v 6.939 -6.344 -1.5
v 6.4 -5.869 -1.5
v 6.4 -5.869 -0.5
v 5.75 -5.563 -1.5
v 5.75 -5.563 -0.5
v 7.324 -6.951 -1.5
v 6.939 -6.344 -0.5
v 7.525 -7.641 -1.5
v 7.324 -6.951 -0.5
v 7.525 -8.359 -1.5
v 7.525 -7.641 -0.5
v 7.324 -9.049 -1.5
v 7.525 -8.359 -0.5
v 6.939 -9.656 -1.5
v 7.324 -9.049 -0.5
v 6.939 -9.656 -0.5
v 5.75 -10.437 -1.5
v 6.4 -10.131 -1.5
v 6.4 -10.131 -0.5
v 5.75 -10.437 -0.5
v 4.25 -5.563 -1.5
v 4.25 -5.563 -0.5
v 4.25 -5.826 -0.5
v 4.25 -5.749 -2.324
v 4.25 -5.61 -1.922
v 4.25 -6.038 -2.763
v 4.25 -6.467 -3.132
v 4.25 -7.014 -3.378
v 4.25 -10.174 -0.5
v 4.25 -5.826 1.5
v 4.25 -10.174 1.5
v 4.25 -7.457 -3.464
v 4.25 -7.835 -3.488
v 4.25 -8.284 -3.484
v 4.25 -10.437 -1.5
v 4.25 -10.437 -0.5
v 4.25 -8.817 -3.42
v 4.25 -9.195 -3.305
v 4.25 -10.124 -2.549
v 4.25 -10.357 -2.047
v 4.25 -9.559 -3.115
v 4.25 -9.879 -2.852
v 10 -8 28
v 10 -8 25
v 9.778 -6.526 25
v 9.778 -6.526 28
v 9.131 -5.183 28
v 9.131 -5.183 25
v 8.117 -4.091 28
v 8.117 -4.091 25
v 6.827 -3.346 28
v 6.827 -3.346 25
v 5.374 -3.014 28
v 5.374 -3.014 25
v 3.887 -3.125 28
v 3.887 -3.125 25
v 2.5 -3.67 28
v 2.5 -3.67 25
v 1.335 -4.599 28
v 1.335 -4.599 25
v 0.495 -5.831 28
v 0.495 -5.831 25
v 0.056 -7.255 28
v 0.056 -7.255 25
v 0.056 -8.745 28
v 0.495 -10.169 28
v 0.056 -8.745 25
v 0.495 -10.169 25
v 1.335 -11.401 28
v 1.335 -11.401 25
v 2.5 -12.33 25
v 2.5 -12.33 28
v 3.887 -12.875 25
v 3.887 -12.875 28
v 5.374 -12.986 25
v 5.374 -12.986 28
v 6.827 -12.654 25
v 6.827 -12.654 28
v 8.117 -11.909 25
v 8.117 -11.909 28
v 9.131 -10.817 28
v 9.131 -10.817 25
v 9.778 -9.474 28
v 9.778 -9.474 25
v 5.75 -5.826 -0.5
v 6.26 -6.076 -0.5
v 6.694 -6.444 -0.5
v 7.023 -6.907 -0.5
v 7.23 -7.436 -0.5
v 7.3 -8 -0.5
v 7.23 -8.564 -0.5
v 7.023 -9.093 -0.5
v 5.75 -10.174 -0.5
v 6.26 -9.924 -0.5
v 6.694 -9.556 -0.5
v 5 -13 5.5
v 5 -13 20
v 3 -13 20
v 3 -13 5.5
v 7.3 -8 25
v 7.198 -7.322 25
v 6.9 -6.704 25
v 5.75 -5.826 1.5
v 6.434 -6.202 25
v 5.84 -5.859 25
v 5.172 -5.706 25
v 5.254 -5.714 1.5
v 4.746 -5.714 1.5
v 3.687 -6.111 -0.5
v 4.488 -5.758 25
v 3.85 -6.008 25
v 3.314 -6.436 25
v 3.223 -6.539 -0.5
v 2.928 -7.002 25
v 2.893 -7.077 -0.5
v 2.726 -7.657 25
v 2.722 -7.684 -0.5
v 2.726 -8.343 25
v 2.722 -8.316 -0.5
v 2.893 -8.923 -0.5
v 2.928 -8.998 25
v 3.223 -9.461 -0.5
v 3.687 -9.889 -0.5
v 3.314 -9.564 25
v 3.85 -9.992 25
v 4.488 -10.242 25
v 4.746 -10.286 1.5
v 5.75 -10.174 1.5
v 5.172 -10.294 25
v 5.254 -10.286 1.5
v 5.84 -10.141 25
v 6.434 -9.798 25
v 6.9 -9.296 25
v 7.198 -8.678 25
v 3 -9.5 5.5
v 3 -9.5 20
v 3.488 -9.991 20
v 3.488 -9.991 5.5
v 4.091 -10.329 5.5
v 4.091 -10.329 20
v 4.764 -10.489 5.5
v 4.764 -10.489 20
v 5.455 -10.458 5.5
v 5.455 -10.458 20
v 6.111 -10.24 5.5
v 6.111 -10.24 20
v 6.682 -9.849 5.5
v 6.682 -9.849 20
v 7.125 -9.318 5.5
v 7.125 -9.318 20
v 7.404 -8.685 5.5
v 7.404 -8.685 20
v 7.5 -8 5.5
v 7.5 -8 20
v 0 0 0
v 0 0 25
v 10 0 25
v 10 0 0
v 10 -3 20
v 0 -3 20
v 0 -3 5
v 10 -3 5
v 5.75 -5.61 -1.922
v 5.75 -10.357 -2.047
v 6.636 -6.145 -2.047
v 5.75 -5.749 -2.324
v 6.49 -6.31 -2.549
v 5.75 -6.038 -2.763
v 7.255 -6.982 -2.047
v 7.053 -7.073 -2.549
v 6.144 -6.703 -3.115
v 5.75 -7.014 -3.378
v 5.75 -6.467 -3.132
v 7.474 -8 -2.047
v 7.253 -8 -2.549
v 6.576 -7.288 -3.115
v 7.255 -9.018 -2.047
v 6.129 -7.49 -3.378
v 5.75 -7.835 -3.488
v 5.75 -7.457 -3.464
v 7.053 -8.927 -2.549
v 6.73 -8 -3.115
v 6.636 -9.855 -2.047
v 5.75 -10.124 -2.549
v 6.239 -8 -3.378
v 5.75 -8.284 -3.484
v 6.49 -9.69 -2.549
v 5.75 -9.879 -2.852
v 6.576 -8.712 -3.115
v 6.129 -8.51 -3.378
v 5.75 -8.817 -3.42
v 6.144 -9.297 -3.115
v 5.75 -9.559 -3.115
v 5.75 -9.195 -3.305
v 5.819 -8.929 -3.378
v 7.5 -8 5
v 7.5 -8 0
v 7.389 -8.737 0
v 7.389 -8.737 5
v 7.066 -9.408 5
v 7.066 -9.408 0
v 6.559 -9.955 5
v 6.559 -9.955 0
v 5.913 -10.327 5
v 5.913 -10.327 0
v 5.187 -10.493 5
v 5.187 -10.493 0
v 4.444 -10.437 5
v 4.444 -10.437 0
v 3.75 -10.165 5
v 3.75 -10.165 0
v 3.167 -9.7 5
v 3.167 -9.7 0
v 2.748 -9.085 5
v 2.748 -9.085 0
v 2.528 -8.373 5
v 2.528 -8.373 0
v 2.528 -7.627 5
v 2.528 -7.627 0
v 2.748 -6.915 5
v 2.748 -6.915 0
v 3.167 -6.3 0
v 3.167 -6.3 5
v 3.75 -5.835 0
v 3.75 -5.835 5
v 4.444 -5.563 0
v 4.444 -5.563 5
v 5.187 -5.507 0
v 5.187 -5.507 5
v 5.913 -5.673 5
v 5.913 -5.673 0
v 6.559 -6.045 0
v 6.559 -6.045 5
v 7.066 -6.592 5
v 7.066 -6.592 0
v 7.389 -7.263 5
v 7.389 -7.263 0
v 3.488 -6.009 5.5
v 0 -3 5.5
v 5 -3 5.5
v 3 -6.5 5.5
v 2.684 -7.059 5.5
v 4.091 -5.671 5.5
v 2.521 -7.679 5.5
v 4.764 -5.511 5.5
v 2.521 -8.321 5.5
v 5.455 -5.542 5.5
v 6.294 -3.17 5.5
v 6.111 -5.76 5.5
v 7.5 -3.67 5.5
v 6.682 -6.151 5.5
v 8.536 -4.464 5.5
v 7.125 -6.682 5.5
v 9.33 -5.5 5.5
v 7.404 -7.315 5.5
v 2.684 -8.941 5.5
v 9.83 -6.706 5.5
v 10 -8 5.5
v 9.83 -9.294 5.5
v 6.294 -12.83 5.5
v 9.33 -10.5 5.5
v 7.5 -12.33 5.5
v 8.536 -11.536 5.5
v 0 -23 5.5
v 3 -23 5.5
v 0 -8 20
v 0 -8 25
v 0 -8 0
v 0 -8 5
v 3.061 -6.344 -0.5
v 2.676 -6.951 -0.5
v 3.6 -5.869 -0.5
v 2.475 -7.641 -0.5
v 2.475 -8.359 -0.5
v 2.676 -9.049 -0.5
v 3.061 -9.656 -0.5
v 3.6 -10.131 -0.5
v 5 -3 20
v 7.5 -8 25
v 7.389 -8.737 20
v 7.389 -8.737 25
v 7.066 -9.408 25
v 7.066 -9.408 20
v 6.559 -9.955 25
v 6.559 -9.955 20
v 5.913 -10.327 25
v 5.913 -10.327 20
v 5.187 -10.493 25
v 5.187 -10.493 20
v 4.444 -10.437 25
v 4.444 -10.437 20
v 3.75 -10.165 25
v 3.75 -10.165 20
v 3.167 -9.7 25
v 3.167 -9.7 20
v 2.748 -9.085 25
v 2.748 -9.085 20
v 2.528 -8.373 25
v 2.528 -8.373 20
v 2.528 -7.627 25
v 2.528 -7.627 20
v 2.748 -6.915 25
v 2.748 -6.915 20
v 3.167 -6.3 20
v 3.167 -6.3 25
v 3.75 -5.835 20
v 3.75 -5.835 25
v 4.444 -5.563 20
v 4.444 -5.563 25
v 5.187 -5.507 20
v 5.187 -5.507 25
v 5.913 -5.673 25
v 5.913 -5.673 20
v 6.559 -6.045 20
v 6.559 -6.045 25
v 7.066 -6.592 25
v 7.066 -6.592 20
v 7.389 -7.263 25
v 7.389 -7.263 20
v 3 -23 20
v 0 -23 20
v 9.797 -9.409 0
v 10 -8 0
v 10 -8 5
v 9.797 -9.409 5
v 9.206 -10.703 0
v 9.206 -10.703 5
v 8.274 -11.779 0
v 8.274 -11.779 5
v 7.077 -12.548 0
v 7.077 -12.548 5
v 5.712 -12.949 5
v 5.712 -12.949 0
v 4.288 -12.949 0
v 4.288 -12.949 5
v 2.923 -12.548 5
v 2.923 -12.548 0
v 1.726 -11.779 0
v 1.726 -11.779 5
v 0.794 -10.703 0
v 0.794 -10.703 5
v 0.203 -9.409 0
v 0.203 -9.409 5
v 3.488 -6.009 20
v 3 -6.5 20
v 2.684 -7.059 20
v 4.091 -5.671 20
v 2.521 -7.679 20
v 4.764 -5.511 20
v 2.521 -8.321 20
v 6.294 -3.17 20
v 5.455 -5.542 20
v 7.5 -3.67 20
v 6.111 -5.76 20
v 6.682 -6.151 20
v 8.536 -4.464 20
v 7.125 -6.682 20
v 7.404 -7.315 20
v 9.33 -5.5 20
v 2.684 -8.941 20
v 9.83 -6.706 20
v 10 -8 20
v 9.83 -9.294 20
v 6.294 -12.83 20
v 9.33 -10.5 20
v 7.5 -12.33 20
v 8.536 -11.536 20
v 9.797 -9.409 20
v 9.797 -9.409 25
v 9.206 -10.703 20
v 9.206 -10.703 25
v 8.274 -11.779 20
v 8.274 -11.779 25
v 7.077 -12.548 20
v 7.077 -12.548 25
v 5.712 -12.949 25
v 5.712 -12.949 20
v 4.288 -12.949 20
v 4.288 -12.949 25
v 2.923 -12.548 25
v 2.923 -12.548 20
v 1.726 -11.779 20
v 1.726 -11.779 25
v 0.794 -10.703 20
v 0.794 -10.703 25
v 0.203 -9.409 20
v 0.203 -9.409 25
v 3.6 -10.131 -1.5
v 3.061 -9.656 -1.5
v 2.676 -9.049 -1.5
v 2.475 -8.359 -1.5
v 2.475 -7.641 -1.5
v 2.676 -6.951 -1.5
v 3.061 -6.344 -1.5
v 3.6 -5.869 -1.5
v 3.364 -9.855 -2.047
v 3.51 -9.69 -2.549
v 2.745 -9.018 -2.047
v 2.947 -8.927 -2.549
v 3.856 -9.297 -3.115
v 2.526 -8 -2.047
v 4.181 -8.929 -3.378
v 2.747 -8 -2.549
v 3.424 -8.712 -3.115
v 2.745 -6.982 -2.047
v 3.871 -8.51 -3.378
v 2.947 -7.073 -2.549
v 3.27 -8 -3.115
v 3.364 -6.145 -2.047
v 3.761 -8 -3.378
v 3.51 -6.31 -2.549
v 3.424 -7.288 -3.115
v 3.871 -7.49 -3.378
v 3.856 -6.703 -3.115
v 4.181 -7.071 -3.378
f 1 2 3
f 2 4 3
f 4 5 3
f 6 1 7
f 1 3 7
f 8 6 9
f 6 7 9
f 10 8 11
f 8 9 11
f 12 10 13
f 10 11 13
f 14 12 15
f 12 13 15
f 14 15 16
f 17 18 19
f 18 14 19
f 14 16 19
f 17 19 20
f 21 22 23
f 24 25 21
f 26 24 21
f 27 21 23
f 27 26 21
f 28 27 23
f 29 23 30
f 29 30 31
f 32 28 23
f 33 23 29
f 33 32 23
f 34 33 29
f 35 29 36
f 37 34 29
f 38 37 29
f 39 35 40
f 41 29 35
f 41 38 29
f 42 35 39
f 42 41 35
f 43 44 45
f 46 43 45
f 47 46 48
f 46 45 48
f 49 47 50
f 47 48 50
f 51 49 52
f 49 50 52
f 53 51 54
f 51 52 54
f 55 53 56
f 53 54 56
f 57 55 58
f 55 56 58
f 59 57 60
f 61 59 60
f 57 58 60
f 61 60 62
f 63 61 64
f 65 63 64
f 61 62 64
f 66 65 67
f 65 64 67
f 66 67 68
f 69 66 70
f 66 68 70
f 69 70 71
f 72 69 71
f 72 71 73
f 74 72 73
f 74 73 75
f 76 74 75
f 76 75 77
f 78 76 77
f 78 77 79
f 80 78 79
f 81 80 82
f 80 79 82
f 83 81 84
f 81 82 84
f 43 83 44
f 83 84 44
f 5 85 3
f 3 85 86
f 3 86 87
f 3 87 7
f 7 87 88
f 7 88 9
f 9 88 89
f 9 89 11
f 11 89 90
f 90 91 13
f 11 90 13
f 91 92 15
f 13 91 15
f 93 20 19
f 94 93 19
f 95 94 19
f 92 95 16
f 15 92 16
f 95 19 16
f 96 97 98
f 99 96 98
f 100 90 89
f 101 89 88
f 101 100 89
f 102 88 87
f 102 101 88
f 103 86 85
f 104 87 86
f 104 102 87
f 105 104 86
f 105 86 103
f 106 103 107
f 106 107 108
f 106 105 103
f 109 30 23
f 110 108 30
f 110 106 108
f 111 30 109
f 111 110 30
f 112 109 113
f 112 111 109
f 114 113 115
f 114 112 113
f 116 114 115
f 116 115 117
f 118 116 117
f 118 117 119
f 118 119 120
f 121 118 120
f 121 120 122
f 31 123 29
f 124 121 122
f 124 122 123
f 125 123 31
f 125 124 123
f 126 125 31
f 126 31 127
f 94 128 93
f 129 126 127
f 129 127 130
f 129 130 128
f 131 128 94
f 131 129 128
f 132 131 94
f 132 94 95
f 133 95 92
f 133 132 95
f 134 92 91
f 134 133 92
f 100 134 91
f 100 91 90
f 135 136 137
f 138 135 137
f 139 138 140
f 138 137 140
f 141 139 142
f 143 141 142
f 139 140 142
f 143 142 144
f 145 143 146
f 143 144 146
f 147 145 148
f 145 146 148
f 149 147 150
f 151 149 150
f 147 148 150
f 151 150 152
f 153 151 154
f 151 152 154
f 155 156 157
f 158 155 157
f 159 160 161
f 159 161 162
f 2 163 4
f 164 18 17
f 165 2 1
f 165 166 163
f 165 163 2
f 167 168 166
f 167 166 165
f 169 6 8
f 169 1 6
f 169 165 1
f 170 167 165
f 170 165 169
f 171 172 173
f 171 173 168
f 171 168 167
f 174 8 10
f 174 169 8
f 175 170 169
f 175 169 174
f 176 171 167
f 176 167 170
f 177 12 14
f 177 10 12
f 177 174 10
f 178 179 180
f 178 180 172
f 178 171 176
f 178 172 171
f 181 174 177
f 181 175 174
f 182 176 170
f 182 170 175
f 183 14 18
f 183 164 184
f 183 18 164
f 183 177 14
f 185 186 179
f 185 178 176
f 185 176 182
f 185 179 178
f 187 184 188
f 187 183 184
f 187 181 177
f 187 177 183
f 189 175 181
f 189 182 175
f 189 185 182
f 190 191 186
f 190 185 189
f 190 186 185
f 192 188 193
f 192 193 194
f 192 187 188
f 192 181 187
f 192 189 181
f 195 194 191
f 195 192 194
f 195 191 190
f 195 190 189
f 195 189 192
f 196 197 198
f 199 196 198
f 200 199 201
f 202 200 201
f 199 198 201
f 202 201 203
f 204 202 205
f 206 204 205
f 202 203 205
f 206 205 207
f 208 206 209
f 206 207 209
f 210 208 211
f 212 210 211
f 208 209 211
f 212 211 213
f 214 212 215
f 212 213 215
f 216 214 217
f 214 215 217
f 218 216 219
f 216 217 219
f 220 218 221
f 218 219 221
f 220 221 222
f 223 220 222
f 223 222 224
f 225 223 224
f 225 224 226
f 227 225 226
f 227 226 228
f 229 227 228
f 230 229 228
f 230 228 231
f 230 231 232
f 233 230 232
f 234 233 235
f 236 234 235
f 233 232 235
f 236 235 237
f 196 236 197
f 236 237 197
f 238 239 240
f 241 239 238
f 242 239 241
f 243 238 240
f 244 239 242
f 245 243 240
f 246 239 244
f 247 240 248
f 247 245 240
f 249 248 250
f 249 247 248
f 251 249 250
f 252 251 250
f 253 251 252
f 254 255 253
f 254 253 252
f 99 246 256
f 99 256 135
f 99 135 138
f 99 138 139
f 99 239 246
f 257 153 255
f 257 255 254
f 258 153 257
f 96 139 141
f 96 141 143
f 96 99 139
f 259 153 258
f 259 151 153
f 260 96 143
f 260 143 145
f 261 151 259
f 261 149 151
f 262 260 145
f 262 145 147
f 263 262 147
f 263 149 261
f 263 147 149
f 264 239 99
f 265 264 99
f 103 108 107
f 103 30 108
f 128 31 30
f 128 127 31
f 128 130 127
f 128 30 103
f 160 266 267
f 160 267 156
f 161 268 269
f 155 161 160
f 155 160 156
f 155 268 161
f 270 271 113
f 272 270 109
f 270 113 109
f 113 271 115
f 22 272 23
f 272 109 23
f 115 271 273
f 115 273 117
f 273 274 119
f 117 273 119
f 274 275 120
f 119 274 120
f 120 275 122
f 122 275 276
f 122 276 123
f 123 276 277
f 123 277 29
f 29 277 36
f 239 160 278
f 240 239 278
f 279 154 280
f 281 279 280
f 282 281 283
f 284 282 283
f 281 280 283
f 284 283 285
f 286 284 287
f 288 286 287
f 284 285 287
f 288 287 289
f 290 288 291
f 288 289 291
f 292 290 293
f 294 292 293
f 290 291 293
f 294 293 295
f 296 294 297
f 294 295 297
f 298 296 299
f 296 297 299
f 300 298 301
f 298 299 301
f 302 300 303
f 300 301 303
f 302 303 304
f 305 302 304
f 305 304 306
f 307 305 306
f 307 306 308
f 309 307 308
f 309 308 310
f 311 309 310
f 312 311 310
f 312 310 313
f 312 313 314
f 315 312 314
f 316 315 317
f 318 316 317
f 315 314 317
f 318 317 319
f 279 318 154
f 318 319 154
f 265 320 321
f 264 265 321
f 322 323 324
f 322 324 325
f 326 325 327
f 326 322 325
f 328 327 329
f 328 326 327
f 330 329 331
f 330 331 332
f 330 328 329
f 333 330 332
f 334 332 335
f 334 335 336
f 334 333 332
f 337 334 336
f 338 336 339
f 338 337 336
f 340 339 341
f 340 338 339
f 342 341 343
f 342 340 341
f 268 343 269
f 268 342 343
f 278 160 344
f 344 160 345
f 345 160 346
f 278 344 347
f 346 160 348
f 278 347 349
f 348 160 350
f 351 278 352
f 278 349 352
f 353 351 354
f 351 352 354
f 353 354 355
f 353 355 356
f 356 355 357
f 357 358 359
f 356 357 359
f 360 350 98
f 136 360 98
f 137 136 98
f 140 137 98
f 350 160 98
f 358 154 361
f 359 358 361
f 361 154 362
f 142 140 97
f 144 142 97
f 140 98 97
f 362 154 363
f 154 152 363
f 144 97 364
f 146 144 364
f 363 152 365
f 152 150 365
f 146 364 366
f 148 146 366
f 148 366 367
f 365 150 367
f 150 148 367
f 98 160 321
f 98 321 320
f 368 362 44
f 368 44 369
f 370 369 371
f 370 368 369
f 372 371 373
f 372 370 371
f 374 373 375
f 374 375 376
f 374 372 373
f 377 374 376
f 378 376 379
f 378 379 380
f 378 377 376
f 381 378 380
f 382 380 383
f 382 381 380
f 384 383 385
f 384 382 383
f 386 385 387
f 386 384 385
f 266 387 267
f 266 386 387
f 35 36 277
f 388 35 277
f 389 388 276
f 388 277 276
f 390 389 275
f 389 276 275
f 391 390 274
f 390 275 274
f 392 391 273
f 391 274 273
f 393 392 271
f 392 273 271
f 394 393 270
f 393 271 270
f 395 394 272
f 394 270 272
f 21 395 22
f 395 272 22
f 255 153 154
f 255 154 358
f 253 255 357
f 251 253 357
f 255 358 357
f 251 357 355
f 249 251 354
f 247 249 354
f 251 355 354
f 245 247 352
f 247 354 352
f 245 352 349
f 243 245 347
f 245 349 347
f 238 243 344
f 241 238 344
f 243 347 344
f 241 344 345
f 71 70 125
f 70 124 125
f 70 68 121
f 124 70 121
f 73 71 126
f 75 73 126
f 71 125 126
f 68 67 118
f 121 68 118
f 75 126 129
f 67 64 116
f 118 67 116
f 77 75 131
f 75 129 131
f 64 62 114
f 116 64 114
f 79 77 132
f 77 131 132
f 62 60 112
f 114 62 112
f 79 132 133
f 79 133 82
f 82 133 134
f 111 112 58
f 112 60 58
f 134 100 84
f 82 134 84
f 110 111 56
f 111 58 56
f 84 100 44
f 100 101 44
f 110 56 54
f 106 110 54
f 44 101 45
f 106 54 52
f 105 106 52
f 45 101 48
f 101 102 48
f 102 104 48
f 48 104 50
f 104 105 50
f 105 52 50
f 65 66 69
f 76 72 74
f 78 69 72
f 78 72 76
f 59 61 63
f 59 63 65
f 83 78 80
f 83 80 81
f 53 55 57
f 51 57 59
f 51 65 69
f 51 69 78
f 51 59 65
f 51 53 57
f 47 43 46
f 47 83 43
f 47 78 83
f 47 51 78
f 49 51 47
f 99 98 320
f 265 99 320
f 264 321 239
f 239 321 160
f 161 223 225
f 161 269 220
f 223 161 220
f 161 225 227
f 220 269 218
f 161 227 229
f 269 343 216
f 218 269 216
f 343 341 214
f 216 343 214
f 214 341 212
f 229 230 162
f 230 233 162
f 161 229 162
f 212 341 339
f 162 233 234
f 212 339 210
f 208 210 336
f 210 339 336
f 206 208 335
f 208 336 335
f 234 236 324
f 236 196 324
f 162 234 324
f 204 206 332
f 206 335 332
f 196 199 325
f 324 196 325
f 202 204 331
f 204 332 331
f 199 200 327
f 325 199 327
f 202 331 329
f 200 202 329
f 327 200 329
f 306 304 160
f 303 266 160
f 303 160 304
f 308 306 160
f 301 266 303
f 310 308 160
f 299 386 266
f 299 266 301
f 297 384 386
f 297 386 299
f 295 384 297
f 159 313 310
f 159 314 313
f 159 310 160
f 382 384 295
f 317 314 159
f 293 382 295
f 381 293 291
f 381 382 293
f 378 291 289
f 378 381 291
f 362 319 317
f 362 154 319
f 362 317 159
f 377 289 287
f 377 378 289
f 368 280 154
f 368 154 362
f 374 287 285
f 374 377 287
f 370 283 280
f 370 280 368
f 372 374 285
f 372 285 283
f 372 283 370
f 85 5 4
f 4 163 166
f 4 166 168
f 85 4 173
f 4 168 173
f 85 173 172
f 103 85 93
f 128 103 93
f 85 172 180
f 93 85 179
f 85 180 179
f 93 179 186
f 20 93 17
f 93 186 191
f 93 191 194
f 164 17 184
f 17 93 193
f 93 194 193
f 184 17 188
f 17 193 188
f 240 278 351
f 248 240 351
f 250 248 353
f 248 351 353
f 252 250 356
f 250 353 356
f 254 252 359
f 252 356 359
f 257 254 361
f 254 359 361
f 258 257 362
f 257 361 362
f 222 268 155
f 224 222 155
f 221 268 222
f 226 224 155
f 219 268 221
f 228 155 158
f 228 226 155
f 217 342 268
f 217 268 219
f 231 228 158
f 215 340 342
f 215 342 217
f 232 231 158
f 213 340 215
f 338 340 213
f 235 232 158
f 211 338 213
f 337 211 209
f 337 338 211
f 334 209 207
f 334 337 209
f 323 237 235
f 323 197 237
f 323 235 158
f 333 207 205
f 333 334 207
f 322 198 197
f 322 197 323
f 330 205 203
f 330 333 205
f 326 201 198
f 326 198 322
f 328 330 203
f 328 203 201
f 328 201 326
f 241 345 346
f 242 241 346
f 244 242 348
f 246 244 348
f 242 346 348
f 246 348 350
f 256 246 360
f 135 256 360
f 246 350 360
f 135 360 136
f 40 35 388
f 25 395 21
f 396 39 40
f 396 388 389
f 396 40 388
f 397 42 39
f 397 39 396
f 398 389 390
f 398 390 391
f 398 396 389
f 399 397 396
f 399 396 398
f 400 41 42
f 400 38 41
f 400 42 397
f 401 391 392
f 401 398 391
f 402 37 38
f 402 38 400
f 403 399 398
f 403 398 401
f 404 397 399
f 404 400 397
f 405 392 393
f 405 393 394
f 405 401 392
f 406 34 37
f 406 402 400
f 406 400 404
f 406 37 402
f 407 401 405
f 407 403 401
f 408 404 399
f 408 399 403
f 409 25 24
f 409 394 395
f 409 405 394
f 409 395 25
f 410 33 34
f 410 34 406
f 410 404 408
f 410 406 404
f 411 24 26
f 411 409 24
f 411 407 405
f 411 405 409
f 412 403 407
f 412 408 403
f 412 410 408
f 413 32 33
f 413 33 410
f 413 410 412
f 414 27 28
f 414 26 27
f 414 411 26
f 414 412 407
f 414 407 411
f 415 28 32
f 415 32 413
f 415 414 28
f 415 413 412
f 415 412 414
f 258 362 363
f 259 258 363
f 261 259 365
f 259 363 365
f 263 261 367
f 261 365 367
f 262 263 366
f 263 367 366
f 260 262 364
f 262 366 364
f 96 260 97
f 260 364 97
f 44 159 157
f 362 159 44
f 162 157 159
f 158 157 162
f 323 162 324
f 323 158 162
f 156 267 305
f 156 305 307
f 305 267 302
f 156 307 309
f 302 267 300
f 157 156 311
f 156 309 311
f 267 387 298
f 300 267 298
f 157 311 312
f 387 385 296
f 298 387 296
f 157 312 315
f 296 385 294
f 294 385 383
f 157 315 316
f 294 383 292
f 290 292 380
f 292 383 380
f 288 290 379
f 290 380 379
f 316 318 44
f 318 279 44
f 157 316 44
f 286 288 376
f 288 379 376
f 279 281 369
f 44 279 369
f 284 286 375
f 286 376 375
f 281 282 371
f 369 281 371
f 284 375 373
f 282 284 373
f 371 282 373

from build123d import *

# Parameters (mm, degrees)
F0_W      = 10
F0_H      = 25
F1_DEPTH  = 3
F2_R      = 2.5
F3_DEPTH  = 5
F4_START  = -20
F3_FACE_R = 2.5
F4_DEPTH  = 5
F6_DEPTH  = 14.5
F7_R      = 2.5
F7_R_2    = 2.3
F8_DEPTH  = 3
F9_DEPTH  = 25.5
F10_R     = 2.55
F11_DEPTH = 3
F12_R     = 2
F13_W     = 1.5
F13_H     = 8
F14_DEPTH = 5


with BuildPart() as f1:
    # F0 (on Front) → F1 (new body)
    with BuildSketch(Plane.XZ):
        with Locations((5, 12.5)):
            Rectangle(F0_W, F0_H)
    extrude(amount=F1_DEPTH)

    # F2 (on face) → F3 (join)
    with BuildSketch(Plane(origin=(0, 0, 0), x_dir=(1, 0, 0), z_dir=(0, 0, -1))):
        with BuildLine():
            ThreePointArc((5, 3), (8.5355339059, 4.4644660941), (10, 8))
            ThreePointArc((10, 8), (5, 13), (0, 8))
            ThreePointArc((0, 8), (1.4644660941, 4.4644660941), (5, 3))
        make_face()
        with Locations((5, 8)):
            Circle(F2_R, mode=Mode.SUBTRACT)
        with BuildLine():
            ThreePointArc((5, 3), (1.4644660941, 4.4644660941), (0, 8))
            Line((0, 8), (0, 3))
            Line((0, 3), (5, 3))
        make_face()
        with BuildLine():
            Line((10, 3), (10, 8))
            ThreePointArc((10, 8), (8.5355339059, 4.4644660941), (5, 3))
            Line((5, 3), (10, 3))
        make_face()
    extrude(amount=-F3_DEPTH)

    # F3_face (on face) → F4 (join)
    with BuildSketch(Plane(origin=(5, -5.6246622599, 0), x_dir=(1, 0, 0), z_dir=(0, 0, -1)).offset(F4_START)):
        with BuildLine():
            Line((-5, 2.3753377401), (-5, -5.6246622599))
            Line((-5, -5.6246622599), (5, -5.6246622599))
            Line((5, -5.6246622599), (5, 2.3753377401))
            ThreePointArc((5, 2.3753377401), (0, 7.3753377401), (-5, 2.3753377401))
        make_face()
        with Locations((0, 2.3753377401)):
            Circle(F3_FACE_R, mode=Mode.SUBTRACT)
    extrude(amount=-F4_DEPTH)


with BuildPart() as f6:
    # F5 (on face) → F6 (new body)
    with BuildSketch(Plane(origin=(0, 0, 20), x_dir=(1, 0, 0), z_dir=(0, 0, -1))):
        with BuildLine():
            ThreePointArc((0, 8), (0.8166998673, 10.7386127875), (3, 12.582575695))
            Line((3, 12.582575695), (3, 13))
            Line((3, 13), (3, 23))
            Line((3, 23), (0, 23))
            Line((0, 23), (0, 8))
        make_face()
        with BuildLine():
            Line((3, 9.5), (3, 12.582575695))
            ThreePointArc((3, 12.582575695), (0.8166998673, 10.7386127875), (0, 8))
            ThreePointArc((0, 8), (0.8166998673, 5.2613872125), (3, 3.417424305))
            Line((3, 3.417424305), (3, 6.5))
            ThreePointArc((3, 6.5), (2.5, 8), (3, 9.5))
        make_face()
        with BuildLine():
            Line((3, 3), (3, 3.417424305))
            ThreePointArc((3, 3.417424305), (0.8166998673, 5.2613872125), (0, 8))
            Line((0, 8), (0, 3))
            Line((0, 3), (3, 3))
        make_face()
        with BuildLine():
            ThreePointArc((5, 3), (8.5355339059, 4.4644660941), (10, 8))
            ThreePointArc((10, 8), (8.5355339059, 11.5355339059), (5, 13))
            ThreePointArc((5, 13), (3.9784517816, 12.8945315647), (3, 12.582575695))
            Line((3, 12.582575695), (3, 9.5))
            ThreePointArc((3, 9.5), (5.790569415, 10.3717082451), (7.5, 8))
            ThreePointArc((7.5, 8), (5.790569415, 5.6282917549), (3, 6.5))
            Line((3, 6.5), (3, 3.417424305))
            ThreePointArc((3, 3.417424305), (3.9784517816, 3.1054684353), (5, 3))
        make_face()
        with BuildLine():
            Line((3, 3), (5, 3))
            ThreePointArc((5, 3), (3.9784517816, 3.1054684353), (3, 3.417424305))
            Line((3, 3.417424305), (3, 3))
        make_face()
        with BuildLine():
            ThreePointArc((3, 12.582575695), (3.9784517816, 12.8945315647), (5, 13))
            Line((5, 13), (3, 13))
            Line((3, 13), (3, 12.582575695))
        make_face()
    extrude(amount=F6_DEPTH)


with BuildPart() as f8:
    # F7 (on face) → F8 (new body)
    with BuildSketch(Plane.XY.offset(25)):
        with BuildLine():
            ThreePointArc((0, -8), (5, -13), (10, -8))
            ThreePointArc((10, -8), (5, -3), (0, -8))
        make_face()
        with Locations((5, -8)):
            Circle(F7_R, mode=Mode.SUBTRACT)
        with Locations((5, -8)):
            Circle(F7_R)
        with Locations((5, -8)):
            Circle(F7_R_2, mode=Mode.SUBTRACT)
        with Locations((5, -8)):
            Circle(F7_R_2)
    extrude(amount=F8_DEPTH)

    # F7 (on face) → F9 (join)
    with BuildSketch(Plane.XY.offset(25)):
        with Locations((5, -8)):
            Circle(F7_R_2)
    extrude(amount=-F9_DEPTH)

    # F10 (on face) → F11 (join)
    with BuildSketch(Plane(origin=(0, 0, -0.5), x_dir=(1, 0, 0), z_dir=(0, 0, -1))):
        with Locations((5, 8)):
            Circle(F10_R)
    extrude(amount=F11_DEPTH)

    # F12
    f12_edges = [f8.edges().sort_by_distance(p)[0] for p in [
        (2.45, -8, -3.5),
    ]]
    fillet(f12_edges, radius=F12_R)

    # F13 (on face) → F14 (cut)
    with BuildSketch(Plane(origin=(0, 0, -3.5), x_dir=(1, 0, 0), z_dir=(0, 0, -1))):
        with Locations((5, 8)):
            Rectangle(F13_W, F13_H)
    extrude(amount=-F14_DEPTH, mode=Mode.SUBTRACT)


solid = Compound([f1.part, f6.part, f8.part])
